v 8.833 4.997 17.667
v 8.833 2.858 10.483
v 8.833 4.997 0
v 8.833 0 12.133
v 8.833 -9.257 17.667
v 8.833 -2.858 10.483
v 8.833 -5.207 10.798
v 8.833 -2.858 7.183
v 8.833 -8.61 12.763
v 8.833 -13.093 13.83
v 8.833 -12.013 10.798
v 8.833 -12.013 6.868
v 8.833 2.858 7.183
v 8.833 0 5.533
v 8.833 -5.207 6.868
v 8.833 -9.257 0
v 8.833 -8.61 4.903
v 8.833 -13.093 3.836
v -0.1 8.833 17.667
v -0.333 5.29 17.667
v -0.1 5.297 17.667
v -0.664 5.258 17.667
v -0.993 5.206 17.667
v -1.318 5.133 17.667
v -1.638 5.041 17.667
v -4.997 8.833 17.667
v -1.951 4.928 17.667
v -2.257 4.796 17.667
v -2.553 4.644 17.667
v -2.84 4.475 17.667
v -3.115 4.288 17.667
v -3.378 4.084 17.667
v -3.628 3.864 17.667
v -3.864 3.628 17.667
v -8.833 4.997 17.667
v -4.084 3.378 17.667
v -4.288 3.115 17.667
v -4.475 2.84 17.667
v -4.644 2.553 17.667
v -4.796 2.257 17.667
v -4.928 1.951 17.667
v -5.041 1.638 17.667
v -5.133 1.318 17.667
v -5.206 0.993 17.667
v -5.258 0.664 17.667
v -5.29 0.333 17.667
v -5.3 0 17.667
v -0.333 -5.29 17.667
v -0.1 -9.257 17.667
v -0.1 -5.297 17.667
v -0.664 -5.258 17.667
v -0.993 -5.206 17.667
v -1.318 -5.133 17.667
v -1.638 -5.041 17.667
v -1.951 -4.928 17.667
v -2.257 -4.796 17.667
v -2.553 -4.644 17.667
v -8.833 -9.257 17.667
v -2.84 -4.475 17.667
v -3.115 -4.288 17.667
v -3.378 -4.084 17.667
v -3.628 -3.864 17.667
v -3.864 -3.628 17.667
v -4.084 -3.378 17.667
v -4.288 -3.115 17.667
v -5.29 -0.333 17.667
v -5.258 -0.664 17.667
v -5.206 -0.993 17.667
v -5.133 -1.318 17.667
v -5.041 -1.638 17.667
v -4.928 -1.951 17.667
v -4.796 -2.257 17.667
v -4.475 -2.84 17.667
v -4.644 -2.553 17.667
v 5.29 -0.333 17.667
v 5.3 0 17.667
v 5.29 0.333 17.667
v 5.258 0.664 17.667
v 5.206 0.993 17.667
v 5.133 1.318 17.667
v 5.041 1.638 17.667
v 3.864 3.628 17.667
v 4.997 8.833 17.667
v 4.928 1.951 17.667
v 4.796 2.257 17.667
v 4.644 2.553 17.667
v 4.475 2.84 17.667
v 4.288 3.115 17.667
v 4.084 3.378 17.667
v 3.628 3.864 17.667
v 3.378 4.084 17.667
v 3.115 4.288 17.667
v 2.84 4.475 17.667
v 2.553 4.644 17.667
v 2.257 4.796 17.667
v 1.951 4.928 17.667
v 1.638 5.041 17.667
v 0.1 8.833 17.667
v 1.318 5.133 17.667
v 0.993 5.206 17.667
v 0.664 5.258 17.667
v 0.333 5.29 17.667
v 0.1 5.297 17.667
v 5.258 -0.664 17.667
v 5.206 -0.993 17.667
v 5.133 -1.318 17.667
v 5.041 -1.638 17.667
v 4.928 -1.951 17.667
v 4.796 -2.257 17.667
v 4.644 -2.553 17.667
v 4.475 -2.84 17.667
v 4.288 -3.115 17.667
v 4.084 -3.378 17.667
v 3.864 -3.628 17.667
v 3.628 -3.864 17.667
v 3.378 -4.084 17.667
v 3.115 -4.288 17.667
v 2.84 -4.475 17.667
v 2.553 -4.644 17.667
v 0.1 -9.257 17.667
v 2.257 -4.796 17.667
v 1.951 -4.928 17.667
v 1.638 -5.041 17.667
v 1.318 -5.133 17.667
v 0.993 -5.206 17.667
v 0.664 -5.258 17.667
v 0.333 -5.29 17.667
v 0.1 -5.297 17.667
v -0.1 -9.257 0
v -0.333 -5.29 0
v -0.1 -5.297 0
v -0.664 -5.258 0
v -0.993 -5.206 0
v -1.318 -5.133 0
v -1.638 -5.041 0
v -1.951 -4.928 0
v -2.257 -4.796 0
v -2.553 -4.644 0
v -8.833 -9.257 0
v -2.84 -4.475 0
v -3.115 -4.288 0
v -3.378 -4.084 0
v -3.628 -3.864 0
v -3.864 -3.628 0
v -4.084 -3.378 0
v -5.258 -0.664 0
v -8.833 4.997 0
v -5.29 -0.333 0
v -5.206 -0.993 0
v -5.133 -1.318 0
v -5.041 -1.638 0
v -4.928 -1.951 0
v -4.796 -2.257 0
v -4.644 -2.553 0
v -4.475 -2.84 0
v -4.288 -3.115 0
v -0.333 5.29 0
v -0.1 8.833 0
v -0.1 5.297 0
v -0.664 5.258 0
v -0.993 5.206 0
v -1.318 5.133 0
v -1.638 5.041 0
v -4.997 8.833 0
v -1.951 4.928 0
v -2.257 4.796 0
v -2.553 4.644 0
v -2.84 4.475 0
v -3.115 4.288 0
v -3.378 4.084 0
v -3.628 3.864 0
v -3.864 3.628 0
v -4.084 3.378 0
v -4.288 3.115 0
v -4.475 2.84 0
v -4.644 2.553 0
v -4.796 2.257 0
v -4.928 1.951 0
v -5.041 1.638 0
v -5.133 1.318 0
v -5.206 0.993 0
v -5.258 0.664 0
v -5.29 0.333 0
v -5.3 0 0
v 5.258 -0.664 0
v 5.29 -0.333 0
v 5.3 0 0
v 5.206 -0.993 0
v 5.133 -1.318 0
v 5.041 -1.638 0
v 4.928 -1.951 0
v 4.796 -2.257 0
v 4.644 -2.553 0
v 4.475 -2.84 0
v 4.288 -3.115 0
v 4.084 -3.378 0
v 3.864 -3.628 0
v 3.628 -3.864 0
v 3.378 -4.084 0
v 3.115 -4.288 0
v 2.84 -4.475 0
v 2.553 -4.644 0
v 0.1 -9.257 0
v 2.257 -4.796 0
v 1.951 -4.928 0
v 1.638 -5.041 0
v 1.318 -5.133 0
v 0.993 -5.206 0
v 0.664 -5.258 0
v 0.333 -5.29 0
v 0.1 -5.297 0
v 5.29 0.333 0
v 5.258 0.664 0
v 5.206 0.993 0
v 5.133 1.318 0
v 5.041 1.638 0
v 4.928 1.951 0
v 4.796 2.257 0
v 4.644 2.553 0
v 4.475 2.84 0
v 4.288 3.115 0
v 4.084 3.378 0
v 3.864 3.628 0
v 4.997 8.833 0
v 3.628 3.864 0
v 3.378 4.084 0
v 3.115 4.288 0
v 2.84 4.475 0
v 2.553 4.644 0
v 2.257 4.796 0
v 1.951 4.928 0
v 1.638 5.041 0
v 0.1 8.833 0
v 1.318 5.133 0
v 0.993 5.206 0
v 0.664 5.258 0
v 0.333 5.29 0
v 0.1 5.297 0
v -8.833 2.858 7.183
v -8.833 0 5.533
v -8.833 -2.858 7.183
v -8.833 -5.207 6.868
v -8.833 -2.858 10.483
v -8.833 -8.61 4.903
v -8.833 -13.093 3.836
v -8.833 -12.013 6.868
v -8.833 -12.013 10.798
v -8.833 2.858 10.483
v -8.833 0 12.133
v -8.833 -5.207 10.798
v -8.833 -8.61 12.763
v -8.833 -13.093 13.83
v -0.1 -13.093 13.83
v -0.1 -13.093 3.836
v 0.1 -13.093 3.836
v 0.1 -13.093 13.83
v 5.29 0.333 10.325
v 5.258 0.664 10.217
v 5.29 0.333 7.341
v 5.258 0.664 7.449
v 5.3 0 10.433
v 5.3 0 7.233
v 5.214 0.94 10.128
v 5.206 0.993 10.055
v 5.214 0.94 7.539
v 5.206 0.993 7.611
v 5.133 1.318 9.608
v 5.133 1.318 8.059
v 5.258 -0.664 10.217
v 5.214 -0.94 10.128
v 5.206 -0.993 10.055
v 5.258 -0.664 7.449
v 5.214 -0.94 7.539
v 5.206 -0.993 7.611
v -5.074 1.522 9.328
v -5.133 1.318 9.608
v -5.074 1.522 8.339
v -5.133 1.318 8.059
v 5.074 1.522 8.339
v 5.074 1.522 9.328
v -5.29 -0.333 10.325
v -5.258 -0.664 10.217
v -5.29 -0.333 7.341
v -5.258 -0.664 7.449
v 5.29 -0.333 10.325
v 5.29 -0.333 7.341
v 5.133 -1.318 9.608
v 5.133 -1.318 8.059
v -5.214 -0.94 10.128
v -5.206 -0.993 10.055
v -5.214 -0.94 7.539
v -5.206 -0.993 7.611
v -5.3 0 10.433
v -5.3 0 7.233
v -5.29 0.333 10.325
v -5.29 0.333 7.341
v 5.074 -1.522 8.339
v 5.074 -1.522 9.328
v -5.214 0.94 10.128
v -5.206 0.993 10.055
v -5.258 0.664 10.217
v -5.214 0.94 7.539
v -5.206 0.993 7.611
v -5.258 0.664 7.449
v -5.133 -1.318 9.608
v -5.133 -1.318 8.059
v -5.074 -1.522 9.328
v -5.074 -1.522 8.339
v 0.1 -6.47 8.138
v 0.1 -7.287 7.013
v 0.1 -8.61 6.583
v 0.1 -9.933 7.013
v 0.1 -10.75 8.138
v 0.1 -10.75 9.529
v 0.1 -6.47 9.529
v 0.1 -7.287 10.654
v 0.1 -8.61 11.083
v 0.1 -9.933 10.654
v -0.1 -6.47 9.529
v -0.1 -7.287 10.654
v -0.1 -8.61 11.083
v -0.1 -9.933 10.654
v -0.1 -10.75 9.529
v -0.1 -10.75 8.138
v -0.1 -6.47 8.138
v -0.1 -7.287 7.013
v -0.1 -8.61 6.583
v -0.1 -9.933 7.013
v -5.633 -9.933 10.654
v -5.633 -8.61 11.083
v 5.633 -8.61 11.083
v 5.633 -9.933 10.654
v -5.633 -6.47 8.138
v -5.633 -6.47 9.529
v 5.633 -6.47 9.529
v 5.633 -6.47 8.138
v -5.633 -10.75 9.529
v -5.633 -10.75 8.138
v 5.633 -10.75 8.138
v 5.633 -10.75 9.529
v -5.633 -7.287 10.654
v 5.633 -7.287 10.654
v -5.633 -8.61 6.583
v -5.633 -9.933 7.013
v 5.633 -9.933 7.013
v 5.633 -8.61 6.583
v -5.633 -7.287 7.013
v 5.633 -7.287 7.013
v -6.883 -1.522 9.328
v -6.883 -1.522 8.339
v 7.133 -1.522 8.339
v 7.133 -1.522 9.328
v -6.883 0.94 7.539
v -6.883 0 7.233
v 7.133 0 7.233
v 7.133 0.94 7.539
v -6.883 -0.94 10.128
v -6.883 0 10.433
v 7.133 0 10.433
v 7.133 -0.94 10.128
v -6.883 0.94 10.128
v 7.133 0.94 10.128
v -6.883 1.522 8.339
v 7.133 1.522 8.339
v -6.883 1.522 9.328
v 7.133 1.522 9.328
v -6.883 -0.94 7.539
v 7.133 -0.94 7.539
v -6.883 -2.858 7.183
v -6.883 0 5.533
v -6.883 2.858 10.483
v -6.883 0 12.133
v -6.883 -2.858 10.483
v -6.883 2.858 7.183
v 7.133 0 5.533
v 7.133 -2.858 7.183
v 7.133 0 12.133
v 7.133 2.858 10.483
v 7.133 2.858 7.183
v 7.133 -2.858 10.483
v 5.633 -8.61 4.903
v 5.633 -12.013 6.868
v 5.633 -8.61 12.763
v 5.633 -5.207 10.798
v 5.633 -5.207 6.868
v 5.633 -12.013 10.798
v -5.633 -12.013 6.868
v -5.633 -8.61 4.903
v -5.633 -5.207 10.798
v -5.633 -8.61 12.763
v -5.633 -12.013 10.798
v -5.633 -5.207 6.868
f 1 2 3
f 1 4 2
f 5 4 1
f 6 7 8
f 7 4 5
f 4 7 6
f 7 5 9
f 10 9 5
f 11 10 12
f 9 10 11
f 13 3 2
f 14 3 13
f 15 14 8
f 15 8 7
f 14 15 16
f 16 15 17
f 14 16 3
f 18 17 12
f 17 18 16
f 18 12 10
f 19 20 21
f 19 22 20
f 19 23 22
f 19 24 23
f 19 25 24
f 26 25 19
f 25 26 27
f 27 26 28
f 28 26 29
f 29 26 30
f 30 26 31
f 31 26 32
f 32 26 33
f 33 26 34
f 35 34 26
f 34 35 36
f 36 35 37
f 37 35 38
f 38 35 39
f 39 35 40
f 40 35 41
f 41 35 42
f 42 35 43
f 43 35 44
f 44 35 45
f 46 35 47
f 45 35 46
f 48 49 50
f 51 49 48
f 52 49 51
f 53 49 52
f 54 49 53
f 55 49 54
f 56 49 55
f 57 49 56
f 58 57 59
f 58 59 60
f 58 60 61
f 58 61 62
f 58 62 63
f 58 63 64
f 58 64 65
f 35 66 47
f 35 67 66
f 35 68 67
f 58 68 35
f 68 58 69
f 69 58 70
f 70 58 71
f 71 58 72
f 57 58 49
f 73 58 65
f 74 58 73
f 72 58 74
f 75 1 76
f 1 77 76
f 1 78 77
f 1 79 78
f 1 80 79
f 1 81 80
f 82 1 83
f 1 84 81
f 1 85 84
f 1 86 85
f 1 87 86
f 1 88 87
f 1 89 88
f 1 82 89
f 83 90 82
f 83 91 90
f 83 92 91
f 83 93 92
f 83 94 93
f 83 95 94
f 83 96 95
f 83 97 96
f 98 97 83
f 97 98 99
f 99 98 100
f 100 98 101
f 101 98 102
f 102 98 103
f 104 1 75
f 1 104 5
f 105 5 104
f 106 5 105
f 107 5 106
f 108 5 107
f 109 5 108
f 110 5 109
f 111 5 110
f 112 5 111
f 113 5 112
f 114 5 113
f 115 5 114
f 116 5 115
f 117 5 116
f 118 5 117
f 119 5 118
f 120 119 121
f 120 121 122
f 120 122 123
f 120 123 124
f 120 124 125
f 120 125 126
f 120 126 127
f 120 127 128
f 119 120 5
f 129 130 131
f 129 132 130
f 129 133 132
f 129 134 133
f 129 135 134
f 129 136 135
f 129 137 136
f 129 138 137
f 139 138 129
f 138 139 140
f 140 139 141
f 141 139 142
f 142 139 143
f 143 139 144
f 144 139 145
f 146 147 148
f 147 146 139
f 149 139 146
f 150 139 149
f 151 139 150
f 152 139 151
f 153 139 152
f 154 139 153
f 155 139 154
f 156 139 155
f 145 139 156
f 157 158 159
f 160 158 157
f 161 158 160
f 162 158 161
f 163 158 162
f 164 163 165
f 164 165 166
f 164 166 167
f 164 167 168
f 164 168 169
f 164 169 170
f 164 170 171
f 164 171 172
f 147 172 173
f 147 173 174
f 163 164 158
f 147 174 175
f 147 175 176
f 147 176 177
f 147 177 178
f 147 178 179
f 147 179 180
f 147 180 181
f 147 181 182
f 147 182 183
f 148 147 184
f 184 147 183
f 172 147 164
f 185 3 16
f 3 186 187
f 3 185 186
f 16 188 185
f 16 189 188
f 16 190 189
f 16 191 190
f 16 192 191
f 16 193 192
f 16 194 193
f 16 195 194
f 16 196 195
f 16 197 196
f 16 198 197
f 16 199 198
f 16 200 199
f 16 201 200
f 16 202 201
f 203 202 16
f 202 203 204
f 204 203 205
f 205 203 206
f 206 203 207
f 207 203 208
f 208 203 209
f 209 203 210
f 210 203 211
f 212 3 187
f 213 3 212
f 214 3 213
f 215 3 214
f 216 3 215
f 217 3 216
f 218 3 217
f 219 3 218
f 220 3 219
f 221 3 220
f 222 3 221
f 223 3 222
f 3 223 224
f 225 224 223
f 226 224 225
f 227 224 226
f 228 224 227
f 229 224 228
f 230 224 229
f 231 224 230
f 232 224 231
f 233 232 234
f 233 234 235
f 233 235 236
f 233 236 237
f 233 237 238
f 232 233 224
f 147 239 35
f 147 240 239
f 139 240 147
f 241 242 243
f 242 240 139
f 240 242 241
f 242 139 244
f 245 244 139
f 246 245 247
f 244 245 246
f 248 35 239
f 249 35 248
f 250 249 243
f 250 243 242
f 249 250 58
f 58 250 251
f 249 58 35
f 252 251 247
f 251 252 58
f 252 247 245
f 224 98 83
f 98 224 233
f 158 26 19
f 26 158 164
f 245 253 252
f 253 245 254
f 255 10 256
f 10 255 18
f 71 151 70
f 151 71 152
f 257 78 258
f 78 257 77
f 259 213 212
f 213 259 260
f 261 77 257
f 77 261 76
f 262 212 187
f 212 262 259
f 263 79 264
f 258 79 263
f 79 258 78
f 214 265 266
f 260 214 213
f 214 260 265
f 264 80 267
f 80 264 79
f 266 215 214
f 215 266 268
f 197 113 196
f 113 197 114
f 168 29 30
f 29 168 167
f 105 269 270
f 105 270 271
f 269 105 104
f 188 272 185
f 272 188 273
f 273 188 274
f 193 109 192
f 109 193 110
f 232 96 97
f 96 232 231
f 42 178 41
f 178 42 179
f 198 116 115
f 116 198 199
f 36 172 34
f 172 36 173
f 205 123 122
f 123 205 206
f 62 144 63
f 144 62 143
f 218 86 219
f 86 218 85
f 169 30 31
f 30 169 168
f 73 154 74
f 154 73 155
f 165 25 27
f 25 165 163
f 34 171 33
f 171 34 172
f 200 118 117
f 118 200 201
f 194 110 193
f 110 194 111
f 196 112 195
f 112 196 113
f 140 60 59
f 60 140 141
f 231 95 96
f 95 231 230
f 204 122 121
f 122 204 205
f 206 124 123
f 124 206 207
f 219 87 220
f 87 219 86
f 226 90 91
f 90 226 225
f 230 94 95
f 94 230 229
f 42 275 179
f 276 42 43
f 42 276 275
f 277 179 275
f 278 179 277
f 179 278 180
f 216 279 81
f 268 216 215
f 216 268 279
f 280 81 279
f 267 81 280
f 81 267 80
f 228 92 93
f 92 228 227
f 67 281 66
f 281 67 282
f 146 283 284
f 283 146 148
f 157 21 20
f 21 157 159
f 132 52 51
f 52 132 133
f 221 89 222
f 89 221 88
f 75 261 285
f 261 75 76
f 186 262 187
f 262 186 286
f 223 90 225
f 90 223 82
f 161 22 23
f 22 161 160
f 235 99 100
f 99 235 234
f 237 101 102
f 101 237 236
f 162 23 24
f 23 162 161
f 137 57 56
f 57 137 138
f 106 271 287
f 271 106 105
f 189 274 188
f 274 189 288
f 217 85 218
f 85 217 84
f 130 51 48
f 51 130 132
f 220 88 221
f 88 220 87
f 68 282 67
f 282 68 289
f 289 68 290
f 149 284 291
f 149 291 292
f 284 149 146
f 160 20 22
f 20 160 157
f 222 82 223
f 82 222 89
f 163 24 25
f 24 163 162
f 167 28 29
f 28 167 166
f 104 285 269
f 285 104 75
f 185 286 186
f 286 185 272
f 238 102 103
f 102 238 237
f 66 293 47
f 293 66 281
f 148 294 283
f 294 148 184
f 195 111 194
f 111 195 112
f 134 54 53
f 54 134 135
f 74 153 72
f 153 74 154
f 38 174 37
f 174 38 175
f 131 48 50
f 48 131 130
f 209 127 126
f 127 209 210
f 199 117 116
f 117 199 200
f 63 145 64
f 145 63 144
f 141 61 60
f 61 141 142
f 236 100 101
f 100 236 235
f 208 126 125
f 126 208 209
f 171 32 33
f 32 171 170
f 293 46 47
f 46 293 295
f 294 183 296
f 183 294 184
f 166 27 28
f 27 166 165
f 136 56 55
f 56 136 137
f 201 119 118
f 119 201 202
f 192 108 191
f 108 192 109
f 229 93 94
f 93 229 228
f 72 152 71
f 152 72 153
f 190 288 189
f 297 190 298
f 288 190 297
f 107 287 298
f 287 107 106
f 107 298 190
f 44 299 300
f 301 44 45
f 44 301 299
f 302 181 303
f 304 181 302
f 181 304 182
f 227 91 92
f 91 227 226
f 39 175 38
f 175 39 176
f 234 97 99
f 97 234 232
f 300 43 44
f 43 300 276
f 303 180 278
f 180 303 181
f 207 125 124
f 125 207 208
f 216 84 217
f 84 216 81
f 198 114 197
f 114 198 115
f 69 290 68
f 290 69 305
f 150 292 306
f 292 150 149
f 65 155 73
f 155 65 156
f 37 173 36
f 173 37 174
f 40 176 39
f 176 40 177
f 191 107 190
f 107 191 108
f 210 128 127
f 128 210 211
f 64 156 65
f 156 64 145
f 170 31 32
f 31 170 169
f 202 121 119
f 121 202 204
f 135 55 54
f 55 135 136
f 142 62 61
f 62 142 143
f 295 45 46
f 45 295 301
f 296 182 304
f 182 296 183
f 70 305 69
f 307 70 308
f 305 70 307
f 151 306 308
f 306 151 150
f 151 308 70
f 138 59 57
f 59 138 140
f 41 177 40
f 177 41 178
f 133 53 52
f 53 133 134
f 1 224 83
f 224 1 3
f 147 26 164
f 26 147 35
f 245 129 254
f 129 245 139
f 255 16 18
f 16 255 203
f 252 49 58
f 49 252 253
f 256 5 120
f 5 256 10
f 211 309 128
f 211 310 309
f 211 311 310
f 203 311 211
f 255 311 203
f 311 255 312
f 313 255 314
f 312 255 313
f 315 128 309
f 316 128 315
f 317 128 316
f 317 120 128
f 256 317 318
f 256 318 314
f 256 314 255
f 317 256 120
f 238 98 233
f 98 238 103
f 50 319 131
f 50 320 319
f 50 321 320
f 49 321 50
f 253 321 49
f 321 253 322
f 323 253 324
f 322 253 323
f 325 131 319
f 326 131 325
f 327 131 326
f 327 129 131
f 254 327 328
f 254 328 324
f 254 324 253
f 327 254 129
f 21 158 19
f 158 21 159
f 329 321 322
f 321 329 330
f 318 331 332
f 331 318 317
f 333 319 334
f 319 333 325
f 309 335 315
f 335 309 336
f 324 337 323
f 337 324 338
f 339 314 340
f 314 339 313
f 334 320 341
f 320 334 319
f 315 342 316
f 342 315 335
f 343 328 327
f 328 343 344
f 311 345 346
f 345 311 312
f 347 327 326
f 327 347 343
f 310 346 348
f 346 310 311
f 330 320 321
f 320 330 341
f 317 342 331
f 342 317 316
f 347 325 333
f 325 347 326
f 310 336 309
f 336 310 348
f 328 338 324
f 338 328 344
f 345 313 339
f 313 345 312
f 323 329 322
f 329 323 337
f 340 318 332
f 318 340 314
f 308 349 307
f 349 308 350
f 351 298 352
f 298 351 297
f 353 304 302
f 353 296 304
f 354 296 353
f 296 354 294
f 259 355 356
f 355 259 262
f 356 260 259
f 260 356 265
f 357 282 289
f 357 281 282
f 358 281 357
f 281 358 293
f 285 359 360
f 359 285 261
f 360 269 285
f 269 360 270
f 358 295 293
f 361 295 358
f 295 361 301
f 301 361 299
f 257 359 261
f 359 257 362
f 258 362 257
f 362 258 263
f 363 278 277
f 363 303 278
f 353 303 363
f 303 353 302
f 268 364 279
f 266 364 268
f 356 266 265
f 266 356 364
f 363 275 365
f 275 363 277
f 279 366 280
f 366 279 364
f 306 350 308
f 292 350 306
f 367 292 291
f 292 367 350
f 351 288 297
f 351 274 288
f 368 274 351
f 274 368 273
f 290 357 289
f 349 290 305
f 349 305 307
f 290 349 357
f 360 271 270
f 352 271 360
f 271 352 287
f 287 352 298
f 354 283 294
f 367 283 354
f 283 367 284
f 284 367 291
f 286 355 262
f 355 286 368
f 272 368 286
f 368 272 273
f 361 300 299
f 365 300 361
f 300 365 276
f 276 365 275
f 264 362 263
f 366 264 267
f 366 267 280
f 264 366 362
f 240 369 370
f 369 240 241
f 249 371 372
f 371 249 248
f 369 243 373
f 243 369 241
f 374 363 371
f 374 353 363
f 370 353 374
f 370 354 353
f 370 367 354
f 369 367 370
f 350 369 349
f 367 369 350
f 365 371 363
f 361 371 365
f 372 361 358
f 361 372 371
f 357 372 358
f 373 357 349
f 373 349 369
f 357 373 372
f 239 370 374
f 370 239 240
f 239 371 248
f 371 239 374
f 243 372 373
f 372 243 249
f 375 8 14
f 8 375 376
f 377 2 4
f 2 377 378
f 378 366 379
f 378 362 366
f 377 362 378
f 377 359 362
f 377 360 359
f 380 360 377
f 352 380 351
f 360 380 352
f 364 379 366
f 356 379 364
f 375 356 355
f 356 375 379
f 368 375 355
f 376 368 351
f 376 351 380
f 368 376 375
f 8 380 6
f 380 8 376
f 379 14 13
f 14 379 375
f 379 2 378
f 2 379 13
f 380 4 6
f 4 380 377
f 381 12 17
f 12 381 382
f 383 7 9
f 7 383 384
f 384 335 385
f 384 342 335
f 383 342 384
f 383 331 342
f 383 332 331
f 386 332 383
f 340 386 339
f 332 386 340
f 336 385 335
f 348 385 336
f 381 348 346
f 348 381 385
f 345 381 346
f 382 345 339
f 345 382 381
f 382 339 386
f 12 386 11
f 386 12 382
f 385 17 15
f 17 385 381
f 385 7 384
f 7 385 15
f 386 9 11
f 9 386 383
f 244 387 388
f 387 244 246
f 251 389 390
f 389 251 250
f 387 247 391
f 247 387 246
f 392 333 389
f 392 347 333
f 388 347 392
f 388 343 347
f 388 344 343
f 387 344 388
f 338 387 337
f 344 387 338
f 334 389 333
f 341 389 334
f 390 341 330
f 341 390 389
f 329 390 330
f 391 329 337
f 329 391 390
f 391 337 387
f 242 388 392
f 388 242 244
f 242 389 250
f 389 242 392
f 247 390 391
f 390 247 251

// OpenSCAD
// file: ../Parameters.scad
//Main tube diameter - hole [mm]
main_tube_outer_diameter = 25.4;
main_tube_inner_diameter = 23.5;

//Tube for undercarriage - hole [mm]
tube_for_undercarriage_outer_diameter = 10.6;
tube_for_undercarriage_inner_diameter = 6;
global_clearance = 0.5;


//umístění podvozkových trubek

second_undercarriage_hole = main_tube_outer_diameter*2 + main_tube_outer_diameter/5 + main_tube_outer_diameter/2 + 170 + 160;

// Parameters of cube couplings
coupling_wall_thickness = main_tube_outer_diameter/5;  //width of coupling walls 
thickness_between_tubes = main_tube_outer_diameter/10;    // minimum distance between tubes in couplings

coupling_wall_thickness_undercarriage = tube_for_undercarriage_outer_diameter/3;
thickness_between_tubes_undercarriage = tube_for_undercarriage_outer_diameter/10;

//Screw diameter and nut for M4 [mm]
M4_screw_diameter=4.5;
Nut_height_M4 = 3.2;
Nut_diameter_M4 = 7.86;


//Screw diameter and nut for M3 [mm]
M3_screw_diameter = 3.2;
Nut_height_M3 = 1.7;	
Nut_diameter_M3 = 6.6; 


//The tube for help
Help_main_tube_outer = 25;
Help_main_tube_inner = 23; 
Help_tube_for_undercarriage_outer = 10;
Help_tube_for_undercarriage_inner = 5;


//main hull parameters

hull_drop_length = 580;
hull_wall_thickness = 0.8;
hull_y_size = 120;
hull_z_size = 150;
hull_x_size = 580;
hull_corner_radius = 4;
hull_airfoil_thickness= 35;  // thickness of drop generating airfoil in percent of lenght.
hull_scale_x = 1;
hull_scale_y = 1.5;
hull_scale_z = 1.5;

main_pilon_position = 170+68;
cover_pilon_position = 180;
height_of_vertical_tube = 275; //278mm je změřená délka trubky. 

ribbon_width = 5; // šířka vyztužovacích lemů. 

// šířka otvoru v přední části kapoty pro držák motoru.
width_of_engine_holder = 63;

//Top Cover Division - dělení horního krytu pro tisk
top_cover_division = [0, 50, 150, 280, 410, hull_x_size]; // upraveny seznam tak, aby deleni začinalo od nuly, což umožňí úplně automatické rozdělení.

//Bottom Cover Division - dělení dolního krytu pro tisk
//bottom_cover_division = [0,100,250,365, 470, hull_x_size];
// zkrácená část pro payload pro testovací tisk
bottom_cover_division = [0,200,250,365, 470, hull_x_size];

//Base Divison - dělení podložky
base_division = [0,140,280,410, hull_x_size];

//Cover pilon division - na výšku (v ose Z)
cover_pilon_division = [0,170,height_of_vertical_tube + main_tube_outer_diameter + coupling_wall_thickness];

//šířka zámků
lock_width = 10;


//accumulator
//základní rozměry akumulátoru
width_of_accumulator = 129.4;//45+1;
depth_of_accumulator = 40.61;
height_of_accumulator = 43.65;
//Zapuštění akumulátoru
sink_of_accumulator = 5; //main_tube_outer_diameter/5 - Nut_height_M3*1.5;

//tloušťka hrany spojky
accumulator_holder_width = 18; 
accumulator_holder_thickness = 10; 

//posunutí akumálátoru na podložce
move_of_accumulator = 165;   // pozice akumulátoru (ovlivňuje těžiště)


////////////////
// Senzory
///////////////////

//opticalFlow
    width_optical_flow_senzor = 45.5;
    depth_optical_flow_senzor = 6;
    height_optical_flow_senzor = 35;
    sink_of_optical_flow_senzor = depth_optical_flow_senzor - 5; 
    M3_optical_flow_senzor_Z = 30.4;
    M3_optical_flow_senzor_X = 24;
    M3_optical_flow_senzor_Z_alone = 9.1;
    M3_optical_flow_senzor_X_alone = 16.7;
// main file
//improving rendering speed.
draft = true;   // sets rendering quality to draft.
$fs = draft ? 5 : 0.5;
$fa = 10;



module 666_1014(draft){

width = tube_for_undercarriage_outer_diameter+2*coupling_wall_thickness_undercarriage;
depth = tube_for_undercarriage_outer_diameter+M3_screw_diameter+2*coupling_wall_thickness_undercarriage+thickness_between_tubes_undercarriage;
height = width;
    
difference(){

    translate([-(width/2),-(depth - tube_for_undercarriage_outer_diameter/2 - coupling_wall_thickness_undercarriage),0])
        cube([width,depth,height]);

	//tube
    translate ([0,0,- global_clearance/2])
        cylinder(h=height + global_clearance,r = tube_for_undercarriage_outer_diameter/2, $fn = draft ? 100 : 200);

    //bevelled edge
    translate([width/2+sqrt(2)*coupling_wall_thickness_undercarriage,0,- global_clearance/2])
        rotate([0,0,45])
           cube([width,width,height+ global_clearance]);

mirror([1,0,0])
    translate([width/2+sqrt(2)*coupling_wall_thickness_undercarriage,0,- global_clearance/2])
        rotate([0,0,45])
            cube([width,width,height + global_clearance]);

    translate([-(width/2) - global_clearance/2,- depth + height/2-sqrt(2)*coupling_wall_thickness_undercarriage,height/2])
        rotate([-135,0,0])
            cube([width + global_clearance, height,height]);
   
   translate([-(width/2) - global_clearance/2, -depth + height/2-sqrt(2)*coupling_wall_thickness_undercarriage,height/2])  
        rotate([45,0,0])
            cube([width + global_clearance,height,height]);  


    // middle cut
    translate ([-0.1,- depth,- global_clearance/2])
        cube ([0.2,depth*2,height + global_clearance]);

    //screw
    translate([-width/2,-(thickness_between_tubes_undercarriage + tube_for_undercarriage_outer_diameter/2+ M4_screw_diameter/2),tube_for_undercarriage_outer_diameter/2+coupling_wall_thickness_undercarriage])
        rotate([0,90,0])
            cylinder(h = width,r = M4_screw_diameter/2, $fn = draft ? 10 : 20);

    translate([-width/2,0,height/2])
        rotate ([0,90,0])
            cylinder(h = width, r = M3_screw_diameter/2, $fn = draft ? 10 :20 );

	//nut
	translate([-width/2 - global_clearance/2,0,height/2])
	   rotate([0,90,0])
	       cylinder (h = Nut_height_M3 + global_clearance, r = Nut_diameter_M3/2, $fn = 6);
    
    translate([width/2 - Nut_height_M3,0,height/2])
	   rotate([0,90,0])
	       cylinder (h = Nut_height_M3 + global_clearance, r = Nut_diameter_M3/2, $fn = 6);

	translate([width/2 - Nut_height_M4,-(thickness_between_tubes_undercarriage + tube_for_undercarriage_outer_diameter/2+ M4_screw_diameter/2),tube_for_undercarriage_outer_diameter/2+coupling_wall_thickness_undercarriage])
	   rotate([0,90,0])
	       cylinder (h = Nut_height_M4 + global_clearance, r = Nut_diameter_M4/2, $fn = 6);

    translate([-width/2 - global_clearance,-(thickness_between_tubes_undercarriage + tube_for_undercarriage_outer_diameter/2+ M4_screw_diameter/2),tube_for_undercarriage_outer_diameter/2+coupling_wall_thickness_undercarriage])
       rotate([0,90,0])
           cylinder (h = Nut_height_M4 + global_clearance, r = Nut_diameter_M4/2, $fn = 6);


    }
}

666_1014(draft);


include <../Parameters.scad>
